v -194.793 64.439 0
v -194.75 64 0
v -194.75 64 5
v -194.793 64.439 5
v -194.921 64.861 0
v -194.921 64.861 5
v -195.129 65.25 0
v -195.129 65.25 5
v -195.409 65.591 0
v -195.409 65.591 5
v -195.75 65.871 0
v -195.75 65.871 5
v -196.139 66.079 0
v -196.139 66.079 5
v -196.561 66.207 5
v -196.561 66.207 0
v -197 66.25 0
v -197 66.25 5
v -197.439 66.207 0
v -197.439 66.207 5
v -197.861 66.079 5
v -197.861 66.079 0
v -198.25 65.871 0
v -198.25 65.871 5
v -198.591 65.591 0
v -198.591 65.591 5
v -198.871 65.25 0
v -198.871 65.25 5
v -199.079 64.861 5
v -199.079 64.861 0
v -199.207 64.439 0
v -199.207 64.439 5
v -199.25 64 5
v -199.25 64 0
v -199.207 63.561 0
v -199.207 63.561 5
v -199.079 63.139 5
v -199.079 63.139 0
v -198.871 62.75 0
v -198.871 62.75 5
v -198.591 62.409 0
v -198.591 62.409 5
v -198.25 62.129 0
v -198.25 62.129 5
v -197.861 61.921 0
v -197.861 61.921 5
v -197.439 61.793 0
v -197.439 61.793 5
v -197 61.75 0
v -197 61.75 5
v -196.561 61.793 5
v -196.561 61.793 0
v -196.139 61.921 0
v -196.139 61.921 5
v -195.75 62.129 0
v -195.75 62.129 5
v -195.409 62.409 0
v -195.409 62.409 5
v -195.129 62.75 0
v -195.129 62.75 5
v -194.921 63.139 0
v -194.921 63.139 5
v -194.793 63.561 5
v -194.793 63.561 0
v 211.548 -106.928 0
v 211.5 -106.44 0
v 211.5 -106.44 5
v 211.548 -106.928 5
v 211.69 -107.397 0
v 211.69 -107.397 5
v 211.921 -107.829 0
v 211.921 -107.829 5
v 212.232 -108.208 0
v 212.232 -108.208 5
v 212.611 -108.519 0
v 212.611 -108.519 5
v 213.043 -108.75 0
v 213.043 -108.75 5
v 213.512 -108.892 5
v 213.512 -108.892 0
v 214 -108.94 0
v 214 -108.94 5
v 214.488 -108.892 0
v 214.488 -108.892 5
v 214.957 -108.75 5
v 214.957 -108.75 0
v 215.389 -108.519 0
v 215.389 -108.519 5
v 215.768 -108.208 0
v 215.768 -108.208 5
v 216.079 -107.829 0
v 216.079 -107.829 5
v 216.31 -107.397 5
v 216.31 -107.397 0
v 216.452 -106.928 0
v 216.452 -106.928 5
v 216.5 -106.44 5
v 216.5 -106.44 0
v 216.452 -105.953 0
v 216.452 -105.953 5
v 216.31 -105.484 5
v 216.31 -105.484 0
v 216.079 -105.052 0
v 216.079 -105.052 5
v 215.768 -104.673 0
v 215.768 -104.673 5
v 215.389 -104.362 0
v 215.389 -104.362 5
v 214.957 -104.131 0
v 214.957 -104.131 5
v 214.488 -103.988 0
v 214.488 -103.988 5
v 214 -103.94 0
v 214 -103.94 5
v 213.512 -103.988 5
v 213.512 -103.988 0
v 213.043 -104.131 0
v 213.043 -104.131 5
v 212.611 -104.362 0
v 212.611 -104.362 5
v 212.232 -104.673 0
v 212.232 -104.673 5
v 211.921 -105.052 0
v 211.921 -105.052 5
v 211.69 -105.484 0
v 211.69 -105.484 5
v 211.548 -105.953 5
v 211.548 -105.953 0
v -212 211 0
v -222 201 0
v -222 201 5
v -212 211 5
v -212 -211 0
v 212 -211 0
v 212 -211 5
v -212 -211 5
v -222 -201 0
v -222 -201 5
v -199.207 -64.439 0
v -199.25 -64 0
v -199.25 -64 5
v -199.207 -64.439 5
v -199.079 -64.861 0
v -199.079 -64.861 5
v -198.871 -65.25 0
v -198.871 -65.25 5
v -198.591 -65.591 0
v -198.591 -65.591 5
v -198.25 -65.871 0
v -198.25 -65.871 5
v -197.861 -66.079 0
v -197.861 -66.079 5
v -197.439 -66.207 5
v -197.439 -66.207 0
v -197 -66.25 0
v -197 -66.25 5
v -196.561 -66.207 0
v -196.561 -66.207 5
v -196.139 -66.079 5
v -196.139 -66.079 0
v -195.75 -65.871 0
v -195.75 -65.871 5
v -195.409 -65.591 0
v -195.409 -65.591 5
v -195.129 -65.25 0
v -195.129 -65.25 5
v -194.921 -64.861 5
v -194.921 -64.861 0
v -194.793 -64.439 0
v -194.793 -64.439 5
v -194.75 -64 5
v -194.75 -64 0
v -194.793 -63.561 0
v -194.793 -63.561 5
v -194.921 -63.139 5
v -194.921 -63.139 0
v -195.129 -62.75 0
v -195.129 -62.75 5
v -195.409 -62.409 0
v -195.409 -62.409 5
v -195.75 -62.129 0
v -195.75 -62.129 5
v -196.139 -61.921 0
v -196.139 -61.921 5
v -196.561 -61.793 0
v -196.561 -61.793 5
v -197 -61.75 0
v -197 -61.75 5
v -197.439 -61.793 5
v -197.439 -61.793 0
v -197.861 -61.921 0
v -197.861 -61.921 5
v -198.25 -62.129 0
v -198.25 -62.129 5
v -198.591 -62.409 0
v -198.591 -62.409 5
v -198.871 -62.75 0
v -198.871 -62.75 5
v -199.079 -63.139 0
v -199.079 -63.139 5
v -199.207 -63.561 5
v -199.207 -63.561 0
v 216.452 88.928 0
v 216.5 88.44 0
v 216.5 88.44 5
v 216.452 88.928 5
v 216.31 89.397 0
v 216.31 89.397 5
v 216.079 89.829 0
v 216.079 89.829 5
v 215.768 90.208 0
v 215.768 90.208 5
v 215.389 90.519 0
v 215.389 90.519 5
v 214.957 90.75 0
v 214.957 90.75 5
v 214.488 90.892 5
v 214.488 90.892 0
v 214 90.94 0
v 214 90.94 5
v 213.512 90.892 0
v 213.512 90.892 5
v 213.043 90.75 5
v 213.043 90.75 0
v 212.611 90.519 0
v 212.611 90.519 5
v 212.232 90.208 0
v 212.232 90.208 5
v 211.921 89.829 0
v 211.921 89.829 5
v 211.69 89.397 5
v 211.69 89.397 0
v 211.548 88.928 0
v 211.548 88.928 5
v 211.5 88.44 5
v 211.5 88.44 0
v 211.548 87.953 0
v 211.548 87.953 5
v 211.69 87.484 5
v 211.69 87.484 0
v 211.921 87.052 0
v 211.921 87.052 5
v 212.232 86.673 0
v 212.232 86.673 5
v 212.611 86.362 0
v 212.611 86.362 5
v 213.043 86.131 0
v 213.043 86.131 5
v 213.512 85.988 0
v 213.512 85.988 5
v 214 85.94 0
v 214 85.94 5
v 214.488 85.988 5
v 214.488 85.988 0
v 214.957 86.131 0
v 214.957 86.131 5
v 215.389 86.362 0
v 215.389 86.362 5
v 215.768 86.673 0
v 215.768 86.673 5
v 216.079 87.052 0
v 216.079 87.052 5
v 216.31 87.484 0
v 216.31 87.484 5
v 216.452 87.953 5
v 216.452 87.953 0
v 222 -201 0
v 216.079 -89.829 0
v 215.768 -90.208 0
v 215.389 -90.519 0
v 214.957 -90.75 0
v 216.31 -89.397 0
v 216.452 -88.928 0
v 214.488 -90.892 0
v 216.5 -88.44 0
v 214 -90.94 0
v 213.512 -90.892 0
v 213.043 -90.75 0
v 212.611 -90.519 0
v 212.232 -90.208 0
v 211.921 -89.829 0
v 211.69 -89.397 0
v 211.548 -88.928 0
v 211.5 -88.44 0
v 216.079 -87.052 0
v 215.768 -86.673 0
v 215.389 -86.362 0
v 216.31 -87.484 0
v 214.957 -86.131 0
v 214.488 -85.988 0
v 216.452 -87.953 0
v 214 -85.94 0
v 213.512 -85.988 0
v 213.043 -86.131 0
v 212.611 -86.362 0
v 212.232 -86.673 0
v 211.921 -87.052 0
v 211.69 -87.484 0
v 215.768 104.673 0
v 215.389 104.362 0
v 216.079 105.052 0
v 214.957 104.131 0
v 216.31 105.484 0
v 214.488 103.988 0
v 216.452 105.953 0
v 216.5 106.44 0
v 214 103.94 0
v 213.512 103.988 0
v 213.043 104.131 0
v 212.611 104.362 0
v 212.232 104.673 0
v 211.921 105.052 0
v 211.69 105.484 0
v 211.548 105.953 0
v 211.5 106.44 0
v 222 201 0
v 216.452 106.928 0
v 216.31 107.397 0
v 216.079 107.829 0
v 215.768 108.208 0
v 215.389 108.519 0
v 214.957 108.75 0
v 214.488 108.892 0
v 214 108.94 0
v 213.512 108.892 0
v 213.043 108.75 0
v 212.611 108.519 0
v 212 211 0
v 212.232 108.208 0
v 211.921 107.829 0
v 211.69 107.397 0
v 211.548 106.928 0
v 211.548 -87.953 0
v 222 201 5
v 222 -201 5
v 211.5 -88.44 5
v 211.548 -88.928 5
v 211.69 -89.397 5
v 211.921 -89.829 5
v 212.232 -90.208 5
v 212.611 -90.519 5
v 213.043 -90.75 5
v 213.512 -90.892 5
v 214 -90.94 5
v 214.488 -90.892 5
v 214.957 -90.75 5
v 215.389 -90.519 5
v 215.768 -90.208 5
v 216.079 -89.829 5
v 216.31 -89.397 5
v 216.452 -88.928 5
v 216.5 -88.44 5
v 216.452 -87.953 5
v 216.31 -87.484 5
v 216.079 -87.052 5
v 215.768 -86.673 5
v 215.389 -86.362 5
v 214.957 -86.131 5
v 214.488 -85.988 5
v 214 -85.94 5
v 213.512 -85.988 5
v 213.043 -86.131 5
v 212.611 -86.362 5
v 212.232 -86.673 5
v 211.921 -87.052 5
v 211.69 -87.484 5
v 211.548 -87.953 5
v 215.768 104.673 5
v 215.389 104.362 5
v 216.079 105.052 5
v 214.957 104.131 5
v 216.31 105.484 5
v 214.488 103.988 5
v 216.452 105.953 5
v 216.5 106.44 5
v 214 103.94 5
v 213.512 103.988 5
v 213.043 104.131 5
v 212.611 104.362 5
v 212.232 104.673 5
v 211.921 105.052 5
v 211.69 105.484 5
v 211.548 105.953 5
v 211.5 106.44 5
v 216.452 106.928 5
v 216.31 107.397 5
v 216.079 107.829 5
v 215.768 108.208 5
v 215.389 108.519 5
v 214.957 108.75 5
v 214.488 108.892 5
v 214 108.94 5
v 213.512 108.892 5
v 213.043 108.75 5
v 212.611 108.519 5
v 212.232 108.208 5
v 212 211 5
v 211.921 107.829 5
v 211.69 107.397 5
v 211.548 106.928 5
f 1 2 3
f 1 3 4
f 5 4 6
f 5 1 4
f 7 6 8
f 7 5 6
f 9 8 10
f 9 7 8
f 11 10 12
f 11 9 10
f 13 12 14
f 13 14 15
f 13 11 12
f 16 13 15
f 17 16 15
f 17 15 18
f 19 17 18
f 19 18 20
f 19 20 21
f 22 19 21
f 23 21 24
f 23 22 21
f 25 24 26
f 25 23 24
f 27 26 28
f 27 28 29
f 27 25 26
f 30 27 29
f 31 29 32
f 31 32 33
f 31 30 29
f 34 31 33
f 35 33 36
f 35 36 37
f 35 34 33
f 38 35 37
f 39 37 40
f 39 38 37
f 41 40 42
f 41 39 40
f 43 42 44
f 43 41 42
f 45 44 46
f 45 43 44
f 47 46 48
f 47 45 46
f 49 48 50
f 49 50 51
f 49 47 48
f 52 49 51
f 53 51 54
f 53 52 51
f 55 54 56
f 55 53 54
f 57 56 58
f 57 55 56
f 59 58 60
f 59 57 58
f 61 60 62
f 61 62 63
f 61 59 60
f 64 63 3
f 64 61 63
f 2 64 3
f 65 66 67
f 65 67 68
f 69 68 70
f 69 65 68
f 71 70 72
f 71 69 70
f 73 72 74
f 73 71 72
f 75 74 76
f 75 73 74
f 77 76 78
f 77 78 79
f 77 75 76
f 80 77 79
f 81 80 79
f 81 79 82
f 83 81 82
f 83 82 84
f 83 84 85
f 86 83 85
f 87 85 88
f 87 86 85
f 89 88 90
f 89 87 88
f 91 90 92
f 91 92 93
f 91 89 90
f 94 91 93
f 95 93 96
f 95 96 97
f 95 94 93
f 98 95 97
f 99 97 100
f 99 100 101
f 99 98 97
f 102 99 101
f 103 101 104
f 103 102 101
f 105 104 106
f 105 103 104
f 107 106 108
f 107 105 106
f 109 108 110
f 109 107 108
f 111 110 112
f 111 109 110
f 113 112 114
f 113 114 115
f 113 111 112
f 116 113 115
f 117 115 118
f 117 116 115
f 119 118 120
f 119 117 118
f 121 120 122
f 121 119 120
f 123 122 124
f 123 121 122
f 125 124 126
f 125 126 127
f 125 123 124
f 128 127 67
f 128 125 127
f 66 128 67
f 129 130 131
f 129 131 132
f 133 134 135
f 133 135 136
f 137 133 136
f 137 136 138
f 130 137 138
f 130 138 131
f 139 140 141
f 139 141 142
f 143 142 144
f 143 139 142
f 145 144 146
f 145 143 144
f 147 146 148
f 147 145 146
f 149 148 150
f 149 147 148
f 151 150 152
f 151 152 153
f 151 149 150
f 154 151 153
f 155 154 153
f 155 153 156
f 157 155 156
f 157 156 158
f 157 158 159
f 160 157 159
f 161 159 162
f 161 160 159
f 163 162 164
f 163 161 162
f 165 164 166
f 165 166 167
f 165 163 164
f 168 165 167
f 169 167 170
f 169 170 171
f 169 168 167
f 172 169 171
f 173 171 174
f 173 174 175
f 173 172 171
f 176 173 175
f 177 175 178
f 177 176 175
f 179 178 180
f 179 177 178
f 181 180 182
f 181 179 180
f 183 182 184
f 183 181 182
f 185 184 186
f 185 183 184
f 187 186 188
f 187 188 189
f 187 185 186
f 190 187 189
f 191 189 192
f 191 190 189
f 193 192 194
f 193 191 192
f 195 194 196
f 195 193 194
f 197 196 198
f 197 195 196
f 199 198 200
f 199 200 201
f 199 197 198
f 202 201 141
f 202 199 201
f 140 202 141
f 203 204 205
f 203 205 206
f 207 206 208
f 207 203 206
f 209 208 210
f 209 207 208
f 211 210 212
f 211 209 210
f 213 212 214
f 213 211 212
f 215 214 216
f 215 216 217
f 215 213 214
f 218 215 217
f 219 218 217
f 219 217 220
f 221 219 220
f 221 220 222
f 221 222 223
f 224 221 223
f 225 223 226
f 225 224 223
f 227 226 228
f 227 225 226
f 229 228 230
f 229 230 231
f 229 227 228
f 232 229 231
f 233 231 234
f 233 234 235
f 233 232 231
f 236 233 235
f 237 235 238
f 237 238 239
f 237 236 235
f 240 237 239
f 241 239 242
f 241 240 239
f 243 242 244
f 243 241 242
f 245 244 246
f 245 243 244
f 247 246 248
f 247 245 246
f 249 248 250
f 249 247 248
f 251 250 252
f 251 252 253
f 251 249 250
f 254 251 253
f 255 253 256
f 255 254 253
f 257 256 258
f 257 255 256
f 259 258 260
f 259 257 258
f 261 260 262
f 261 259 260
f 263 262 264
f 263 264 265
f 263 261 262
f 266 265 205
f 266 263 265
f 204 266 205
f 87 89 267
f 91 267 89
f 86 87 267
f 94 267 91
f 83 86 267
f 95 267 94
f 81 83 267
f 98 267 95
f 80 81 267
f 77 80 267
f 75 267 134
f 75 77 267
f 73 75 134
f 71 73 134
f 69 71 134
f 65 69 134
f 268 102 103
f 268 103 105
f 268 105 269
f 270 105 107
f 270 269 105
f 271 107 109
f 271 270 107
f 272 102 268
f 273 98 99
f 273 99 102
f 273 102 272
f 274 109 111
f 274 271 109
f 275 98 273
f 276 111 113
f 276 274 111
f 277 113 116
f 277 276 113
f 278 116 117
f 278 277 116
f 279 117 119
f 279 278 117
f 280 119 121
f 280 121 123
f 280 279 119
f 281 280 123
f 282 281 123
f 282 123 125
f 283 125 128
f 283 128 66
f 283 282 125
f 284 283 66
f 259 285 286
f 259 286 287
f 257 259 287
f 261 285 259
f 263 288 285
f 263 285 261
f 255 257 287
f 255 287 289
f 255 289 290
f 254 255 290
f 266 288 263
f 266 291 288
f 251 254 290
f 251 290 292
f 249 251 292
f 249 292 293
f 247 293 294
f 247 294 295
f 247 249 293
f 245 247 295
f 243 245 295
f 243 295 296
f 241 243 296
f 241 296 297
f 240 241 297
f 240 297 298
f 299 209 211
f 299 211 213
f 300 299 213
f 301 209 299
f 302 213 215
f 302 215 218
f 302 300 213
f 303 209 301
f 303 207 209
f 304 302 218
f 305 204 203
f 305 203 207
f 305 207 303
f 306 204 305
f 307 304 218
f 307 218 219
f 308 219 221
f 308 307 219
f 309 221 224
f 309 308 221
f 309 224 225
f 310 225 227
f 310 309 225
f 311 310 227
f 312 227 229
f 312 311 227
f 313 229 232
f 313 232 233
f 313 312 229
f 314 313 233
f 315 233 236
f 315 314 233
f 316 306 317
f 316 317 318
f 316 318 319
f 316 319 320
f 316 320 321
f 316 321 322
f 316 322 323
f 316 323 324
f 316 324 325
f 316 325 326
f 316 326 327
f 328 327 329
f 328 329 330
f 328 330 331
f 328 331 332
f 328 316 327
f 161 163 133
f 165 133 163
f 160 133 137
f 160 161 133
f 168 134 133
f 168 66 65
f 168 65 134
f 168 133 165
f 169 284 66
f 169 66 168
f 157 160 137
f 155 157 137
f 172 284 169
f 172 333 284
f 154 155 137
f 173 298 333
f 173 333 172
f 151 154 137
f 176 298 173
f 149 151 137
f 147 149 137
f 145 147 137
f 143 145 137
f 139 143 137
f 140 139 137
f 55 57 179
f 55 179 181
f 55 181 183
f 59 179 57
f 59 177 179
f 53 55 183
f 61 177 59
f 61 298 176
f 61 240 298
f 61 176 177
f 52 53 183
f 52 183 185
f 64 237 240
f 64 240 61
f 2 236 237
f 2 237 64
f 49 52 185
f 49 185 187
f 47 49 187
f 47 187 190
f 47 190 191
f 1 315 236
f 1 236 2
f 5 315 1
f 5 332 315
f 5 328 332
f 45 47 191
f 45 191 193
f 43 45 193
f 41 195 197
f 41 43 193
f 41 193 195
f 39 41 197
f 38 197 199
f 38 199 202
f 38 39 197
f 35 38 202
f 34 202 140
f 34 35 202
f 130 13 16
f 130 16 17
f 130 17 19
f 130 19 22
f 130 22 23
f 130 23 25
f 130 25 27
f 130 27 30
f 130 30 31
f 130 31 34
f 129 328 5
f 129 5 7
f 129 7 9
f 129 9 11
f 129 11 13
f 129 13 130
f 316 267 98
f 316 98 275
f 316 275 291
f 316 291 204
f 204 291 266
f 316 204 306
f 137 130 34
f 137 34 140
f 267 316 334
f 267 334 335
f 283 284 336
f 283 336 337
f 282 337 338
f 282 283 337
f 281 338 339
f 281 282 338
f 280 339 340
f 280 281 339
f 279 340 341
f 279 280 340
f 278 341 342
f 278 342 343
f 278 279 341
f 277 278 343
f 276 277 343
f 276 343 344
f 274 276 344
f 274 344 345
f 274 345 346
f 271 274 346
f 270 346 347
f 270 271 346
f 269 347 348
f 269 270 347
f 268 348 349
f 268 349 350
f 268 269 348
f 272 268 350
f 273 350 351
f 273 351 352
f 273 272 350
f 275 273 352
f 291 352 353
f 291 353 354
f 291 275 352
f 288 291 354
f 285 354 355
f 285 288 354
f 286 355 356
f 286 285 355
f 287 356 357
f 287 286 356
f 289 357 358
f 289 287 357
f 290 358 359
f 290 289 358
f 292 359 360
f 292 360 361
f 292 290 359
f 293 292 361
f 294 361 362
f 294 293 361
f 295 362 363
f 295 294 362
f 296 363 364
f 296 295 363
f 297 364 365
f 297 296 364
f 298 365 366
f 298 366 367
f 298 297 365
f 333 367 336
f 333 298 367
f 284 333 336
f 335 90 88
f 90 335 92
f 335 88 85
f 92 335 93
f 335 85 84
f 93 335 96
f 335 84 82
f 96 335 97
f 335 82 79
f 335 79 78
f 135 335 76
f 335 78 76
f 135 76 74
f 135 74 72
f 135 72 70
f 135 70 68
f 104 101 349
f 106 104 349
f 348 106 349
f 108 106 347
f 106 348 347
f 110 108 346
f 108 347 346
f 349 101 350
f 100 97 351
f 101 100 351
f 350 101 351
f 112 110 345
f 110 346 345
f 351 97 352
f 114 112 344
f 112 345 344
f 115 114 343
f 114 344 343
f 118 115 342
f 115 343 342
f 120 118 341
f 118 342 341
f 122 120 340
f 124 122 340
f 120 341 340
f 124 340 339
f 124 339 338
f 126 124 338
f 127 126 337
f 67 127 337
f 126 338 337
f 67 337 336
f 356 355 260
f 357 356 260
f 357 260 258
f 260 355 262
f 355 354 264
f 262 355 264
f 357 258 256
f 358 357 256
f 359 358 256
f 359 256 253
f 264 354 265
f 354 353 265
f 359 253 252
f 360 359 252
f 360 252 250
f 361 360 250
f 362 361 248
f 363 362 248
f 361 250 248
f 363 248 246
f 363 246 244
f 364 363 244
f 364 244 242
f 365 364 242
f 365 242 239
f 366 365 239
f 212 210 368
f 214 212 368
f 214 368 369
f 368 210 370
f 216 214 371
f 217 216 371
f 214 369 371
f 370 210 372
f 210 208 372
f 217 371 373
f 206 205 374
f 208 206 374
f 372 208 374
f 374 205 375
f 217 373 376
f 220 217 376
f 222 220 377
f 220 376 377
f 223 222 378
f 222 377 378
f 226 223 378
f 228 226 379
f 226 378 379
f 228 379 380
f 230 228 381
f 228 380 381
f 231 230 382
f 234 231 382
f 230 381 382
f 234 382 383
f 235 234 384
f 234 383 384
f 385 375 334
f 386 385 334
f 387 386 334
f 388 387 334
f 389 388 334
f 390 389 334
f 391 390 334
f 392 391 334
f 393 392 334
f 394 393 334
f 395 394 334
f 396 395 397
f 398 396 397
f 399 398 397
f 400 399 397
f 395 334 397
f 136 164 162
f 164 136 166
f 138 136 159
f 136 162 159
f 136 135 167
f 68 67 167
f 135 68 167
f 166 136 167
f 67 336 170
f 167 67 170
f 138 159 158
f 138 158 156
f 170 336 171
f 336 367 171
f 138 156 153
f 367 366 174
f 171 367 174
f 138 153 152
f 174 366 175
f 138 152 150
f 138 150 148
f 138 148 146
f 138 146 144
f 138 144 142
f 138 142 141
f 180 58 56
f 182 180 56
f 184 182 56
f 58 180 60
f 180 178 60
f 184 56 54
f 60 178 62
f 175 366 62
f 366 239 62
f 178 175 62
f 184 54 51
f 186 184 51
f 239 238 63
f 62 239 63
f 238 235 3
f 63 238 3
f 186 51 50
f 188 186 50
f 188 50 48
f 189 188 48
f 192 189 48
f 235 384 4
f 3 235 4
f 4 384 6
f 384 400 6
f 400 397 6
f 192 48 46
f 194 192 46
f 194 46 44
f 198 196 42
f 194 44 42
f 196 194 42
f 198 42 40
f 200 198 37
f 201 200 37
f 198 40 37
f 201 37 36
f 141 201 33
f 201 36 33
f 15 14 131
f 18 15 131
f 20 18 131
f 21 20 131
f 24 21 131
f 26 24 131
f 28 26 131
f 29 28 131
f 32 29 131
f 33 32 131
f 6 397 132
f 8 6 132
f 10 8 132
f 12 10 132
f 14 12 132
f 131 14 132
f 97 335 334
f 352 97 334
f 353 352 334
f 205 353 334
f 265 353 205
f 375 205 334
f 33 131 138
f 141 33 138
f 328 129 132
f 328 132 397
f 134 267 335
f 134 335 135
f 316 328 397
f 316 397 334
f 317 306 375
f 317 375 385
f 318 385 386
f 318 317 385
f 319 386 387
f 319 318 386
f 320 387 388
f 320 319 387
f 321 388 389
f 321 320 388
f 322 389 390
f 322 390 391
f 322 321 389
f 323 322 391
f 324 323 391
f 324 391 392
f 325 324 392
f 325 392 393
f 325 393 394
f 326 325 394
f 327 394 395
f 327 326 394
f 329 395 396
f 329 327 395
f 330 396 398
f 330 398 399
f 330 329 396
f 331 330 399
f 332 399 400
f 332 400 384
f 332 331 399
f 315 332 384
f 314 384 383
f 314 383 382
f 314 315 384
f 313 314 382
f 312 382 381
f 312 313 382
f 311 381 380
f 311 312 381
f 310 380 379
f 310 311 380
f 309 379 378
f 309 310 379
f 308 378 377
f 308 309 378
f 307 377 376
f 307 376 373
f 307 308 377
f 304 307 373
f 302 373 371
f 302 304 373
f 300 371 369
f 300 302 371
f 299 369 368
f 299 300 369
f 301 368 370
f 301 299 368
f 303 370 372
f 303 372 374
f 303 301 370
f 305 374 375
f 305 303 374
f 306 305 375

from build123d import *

# Parameters (mm, degrees)
SCHIZZO1_R                   = 2.5
SCHIZZO1_R_2                 = 2.25
ESTRUSIONE_ESTRUSIONE1_DEPTH = 5


with BuildPart() as part:
    # Schizzo1 → Estrusione-Estrusione1 (new body)
    with BuildSketch(Plane.XY):
        Polygon((-222, 201), (-212, 211), (212, 211), (222, 201), (222, -201), (212, -211), (-212, -211), (-222, -201), align=None)
        with Locations((214, 106.440434068)):
            Circle(SCHIZZO1_R, mode=Mode.SUBTRACT)
        with Locations((214, 88.440434068)):
            Circle(SCHIZZO1_R, mode=Mode.SUBTRACT)
        with Locations(Location((214, -88.440434068, 0), (0, 0, 180))):
            Circle(SCHIZZO1_R, mode=Mode.SUBTRACT)
        with Locations(Location((214, -106.440434068, 0), (0, 0, 180))):
            Circle(SCHIZZO1_R, mode=Mode.SUBTRACT)
        with Locations((-197, 64)):
            Circle(SCHIZZO1_R_2, mode=Mode.SUBTRACT)
        with Locations(Location((-197, -64, 0), (0, 0, 180))):
            Circle(SCHIZZO1_R_2, mode=Mode.SUBTRACT)
    extrude(amount=ESTRUSIONE_ESTRUSIONE1_DEPTH)


solid = part.part
